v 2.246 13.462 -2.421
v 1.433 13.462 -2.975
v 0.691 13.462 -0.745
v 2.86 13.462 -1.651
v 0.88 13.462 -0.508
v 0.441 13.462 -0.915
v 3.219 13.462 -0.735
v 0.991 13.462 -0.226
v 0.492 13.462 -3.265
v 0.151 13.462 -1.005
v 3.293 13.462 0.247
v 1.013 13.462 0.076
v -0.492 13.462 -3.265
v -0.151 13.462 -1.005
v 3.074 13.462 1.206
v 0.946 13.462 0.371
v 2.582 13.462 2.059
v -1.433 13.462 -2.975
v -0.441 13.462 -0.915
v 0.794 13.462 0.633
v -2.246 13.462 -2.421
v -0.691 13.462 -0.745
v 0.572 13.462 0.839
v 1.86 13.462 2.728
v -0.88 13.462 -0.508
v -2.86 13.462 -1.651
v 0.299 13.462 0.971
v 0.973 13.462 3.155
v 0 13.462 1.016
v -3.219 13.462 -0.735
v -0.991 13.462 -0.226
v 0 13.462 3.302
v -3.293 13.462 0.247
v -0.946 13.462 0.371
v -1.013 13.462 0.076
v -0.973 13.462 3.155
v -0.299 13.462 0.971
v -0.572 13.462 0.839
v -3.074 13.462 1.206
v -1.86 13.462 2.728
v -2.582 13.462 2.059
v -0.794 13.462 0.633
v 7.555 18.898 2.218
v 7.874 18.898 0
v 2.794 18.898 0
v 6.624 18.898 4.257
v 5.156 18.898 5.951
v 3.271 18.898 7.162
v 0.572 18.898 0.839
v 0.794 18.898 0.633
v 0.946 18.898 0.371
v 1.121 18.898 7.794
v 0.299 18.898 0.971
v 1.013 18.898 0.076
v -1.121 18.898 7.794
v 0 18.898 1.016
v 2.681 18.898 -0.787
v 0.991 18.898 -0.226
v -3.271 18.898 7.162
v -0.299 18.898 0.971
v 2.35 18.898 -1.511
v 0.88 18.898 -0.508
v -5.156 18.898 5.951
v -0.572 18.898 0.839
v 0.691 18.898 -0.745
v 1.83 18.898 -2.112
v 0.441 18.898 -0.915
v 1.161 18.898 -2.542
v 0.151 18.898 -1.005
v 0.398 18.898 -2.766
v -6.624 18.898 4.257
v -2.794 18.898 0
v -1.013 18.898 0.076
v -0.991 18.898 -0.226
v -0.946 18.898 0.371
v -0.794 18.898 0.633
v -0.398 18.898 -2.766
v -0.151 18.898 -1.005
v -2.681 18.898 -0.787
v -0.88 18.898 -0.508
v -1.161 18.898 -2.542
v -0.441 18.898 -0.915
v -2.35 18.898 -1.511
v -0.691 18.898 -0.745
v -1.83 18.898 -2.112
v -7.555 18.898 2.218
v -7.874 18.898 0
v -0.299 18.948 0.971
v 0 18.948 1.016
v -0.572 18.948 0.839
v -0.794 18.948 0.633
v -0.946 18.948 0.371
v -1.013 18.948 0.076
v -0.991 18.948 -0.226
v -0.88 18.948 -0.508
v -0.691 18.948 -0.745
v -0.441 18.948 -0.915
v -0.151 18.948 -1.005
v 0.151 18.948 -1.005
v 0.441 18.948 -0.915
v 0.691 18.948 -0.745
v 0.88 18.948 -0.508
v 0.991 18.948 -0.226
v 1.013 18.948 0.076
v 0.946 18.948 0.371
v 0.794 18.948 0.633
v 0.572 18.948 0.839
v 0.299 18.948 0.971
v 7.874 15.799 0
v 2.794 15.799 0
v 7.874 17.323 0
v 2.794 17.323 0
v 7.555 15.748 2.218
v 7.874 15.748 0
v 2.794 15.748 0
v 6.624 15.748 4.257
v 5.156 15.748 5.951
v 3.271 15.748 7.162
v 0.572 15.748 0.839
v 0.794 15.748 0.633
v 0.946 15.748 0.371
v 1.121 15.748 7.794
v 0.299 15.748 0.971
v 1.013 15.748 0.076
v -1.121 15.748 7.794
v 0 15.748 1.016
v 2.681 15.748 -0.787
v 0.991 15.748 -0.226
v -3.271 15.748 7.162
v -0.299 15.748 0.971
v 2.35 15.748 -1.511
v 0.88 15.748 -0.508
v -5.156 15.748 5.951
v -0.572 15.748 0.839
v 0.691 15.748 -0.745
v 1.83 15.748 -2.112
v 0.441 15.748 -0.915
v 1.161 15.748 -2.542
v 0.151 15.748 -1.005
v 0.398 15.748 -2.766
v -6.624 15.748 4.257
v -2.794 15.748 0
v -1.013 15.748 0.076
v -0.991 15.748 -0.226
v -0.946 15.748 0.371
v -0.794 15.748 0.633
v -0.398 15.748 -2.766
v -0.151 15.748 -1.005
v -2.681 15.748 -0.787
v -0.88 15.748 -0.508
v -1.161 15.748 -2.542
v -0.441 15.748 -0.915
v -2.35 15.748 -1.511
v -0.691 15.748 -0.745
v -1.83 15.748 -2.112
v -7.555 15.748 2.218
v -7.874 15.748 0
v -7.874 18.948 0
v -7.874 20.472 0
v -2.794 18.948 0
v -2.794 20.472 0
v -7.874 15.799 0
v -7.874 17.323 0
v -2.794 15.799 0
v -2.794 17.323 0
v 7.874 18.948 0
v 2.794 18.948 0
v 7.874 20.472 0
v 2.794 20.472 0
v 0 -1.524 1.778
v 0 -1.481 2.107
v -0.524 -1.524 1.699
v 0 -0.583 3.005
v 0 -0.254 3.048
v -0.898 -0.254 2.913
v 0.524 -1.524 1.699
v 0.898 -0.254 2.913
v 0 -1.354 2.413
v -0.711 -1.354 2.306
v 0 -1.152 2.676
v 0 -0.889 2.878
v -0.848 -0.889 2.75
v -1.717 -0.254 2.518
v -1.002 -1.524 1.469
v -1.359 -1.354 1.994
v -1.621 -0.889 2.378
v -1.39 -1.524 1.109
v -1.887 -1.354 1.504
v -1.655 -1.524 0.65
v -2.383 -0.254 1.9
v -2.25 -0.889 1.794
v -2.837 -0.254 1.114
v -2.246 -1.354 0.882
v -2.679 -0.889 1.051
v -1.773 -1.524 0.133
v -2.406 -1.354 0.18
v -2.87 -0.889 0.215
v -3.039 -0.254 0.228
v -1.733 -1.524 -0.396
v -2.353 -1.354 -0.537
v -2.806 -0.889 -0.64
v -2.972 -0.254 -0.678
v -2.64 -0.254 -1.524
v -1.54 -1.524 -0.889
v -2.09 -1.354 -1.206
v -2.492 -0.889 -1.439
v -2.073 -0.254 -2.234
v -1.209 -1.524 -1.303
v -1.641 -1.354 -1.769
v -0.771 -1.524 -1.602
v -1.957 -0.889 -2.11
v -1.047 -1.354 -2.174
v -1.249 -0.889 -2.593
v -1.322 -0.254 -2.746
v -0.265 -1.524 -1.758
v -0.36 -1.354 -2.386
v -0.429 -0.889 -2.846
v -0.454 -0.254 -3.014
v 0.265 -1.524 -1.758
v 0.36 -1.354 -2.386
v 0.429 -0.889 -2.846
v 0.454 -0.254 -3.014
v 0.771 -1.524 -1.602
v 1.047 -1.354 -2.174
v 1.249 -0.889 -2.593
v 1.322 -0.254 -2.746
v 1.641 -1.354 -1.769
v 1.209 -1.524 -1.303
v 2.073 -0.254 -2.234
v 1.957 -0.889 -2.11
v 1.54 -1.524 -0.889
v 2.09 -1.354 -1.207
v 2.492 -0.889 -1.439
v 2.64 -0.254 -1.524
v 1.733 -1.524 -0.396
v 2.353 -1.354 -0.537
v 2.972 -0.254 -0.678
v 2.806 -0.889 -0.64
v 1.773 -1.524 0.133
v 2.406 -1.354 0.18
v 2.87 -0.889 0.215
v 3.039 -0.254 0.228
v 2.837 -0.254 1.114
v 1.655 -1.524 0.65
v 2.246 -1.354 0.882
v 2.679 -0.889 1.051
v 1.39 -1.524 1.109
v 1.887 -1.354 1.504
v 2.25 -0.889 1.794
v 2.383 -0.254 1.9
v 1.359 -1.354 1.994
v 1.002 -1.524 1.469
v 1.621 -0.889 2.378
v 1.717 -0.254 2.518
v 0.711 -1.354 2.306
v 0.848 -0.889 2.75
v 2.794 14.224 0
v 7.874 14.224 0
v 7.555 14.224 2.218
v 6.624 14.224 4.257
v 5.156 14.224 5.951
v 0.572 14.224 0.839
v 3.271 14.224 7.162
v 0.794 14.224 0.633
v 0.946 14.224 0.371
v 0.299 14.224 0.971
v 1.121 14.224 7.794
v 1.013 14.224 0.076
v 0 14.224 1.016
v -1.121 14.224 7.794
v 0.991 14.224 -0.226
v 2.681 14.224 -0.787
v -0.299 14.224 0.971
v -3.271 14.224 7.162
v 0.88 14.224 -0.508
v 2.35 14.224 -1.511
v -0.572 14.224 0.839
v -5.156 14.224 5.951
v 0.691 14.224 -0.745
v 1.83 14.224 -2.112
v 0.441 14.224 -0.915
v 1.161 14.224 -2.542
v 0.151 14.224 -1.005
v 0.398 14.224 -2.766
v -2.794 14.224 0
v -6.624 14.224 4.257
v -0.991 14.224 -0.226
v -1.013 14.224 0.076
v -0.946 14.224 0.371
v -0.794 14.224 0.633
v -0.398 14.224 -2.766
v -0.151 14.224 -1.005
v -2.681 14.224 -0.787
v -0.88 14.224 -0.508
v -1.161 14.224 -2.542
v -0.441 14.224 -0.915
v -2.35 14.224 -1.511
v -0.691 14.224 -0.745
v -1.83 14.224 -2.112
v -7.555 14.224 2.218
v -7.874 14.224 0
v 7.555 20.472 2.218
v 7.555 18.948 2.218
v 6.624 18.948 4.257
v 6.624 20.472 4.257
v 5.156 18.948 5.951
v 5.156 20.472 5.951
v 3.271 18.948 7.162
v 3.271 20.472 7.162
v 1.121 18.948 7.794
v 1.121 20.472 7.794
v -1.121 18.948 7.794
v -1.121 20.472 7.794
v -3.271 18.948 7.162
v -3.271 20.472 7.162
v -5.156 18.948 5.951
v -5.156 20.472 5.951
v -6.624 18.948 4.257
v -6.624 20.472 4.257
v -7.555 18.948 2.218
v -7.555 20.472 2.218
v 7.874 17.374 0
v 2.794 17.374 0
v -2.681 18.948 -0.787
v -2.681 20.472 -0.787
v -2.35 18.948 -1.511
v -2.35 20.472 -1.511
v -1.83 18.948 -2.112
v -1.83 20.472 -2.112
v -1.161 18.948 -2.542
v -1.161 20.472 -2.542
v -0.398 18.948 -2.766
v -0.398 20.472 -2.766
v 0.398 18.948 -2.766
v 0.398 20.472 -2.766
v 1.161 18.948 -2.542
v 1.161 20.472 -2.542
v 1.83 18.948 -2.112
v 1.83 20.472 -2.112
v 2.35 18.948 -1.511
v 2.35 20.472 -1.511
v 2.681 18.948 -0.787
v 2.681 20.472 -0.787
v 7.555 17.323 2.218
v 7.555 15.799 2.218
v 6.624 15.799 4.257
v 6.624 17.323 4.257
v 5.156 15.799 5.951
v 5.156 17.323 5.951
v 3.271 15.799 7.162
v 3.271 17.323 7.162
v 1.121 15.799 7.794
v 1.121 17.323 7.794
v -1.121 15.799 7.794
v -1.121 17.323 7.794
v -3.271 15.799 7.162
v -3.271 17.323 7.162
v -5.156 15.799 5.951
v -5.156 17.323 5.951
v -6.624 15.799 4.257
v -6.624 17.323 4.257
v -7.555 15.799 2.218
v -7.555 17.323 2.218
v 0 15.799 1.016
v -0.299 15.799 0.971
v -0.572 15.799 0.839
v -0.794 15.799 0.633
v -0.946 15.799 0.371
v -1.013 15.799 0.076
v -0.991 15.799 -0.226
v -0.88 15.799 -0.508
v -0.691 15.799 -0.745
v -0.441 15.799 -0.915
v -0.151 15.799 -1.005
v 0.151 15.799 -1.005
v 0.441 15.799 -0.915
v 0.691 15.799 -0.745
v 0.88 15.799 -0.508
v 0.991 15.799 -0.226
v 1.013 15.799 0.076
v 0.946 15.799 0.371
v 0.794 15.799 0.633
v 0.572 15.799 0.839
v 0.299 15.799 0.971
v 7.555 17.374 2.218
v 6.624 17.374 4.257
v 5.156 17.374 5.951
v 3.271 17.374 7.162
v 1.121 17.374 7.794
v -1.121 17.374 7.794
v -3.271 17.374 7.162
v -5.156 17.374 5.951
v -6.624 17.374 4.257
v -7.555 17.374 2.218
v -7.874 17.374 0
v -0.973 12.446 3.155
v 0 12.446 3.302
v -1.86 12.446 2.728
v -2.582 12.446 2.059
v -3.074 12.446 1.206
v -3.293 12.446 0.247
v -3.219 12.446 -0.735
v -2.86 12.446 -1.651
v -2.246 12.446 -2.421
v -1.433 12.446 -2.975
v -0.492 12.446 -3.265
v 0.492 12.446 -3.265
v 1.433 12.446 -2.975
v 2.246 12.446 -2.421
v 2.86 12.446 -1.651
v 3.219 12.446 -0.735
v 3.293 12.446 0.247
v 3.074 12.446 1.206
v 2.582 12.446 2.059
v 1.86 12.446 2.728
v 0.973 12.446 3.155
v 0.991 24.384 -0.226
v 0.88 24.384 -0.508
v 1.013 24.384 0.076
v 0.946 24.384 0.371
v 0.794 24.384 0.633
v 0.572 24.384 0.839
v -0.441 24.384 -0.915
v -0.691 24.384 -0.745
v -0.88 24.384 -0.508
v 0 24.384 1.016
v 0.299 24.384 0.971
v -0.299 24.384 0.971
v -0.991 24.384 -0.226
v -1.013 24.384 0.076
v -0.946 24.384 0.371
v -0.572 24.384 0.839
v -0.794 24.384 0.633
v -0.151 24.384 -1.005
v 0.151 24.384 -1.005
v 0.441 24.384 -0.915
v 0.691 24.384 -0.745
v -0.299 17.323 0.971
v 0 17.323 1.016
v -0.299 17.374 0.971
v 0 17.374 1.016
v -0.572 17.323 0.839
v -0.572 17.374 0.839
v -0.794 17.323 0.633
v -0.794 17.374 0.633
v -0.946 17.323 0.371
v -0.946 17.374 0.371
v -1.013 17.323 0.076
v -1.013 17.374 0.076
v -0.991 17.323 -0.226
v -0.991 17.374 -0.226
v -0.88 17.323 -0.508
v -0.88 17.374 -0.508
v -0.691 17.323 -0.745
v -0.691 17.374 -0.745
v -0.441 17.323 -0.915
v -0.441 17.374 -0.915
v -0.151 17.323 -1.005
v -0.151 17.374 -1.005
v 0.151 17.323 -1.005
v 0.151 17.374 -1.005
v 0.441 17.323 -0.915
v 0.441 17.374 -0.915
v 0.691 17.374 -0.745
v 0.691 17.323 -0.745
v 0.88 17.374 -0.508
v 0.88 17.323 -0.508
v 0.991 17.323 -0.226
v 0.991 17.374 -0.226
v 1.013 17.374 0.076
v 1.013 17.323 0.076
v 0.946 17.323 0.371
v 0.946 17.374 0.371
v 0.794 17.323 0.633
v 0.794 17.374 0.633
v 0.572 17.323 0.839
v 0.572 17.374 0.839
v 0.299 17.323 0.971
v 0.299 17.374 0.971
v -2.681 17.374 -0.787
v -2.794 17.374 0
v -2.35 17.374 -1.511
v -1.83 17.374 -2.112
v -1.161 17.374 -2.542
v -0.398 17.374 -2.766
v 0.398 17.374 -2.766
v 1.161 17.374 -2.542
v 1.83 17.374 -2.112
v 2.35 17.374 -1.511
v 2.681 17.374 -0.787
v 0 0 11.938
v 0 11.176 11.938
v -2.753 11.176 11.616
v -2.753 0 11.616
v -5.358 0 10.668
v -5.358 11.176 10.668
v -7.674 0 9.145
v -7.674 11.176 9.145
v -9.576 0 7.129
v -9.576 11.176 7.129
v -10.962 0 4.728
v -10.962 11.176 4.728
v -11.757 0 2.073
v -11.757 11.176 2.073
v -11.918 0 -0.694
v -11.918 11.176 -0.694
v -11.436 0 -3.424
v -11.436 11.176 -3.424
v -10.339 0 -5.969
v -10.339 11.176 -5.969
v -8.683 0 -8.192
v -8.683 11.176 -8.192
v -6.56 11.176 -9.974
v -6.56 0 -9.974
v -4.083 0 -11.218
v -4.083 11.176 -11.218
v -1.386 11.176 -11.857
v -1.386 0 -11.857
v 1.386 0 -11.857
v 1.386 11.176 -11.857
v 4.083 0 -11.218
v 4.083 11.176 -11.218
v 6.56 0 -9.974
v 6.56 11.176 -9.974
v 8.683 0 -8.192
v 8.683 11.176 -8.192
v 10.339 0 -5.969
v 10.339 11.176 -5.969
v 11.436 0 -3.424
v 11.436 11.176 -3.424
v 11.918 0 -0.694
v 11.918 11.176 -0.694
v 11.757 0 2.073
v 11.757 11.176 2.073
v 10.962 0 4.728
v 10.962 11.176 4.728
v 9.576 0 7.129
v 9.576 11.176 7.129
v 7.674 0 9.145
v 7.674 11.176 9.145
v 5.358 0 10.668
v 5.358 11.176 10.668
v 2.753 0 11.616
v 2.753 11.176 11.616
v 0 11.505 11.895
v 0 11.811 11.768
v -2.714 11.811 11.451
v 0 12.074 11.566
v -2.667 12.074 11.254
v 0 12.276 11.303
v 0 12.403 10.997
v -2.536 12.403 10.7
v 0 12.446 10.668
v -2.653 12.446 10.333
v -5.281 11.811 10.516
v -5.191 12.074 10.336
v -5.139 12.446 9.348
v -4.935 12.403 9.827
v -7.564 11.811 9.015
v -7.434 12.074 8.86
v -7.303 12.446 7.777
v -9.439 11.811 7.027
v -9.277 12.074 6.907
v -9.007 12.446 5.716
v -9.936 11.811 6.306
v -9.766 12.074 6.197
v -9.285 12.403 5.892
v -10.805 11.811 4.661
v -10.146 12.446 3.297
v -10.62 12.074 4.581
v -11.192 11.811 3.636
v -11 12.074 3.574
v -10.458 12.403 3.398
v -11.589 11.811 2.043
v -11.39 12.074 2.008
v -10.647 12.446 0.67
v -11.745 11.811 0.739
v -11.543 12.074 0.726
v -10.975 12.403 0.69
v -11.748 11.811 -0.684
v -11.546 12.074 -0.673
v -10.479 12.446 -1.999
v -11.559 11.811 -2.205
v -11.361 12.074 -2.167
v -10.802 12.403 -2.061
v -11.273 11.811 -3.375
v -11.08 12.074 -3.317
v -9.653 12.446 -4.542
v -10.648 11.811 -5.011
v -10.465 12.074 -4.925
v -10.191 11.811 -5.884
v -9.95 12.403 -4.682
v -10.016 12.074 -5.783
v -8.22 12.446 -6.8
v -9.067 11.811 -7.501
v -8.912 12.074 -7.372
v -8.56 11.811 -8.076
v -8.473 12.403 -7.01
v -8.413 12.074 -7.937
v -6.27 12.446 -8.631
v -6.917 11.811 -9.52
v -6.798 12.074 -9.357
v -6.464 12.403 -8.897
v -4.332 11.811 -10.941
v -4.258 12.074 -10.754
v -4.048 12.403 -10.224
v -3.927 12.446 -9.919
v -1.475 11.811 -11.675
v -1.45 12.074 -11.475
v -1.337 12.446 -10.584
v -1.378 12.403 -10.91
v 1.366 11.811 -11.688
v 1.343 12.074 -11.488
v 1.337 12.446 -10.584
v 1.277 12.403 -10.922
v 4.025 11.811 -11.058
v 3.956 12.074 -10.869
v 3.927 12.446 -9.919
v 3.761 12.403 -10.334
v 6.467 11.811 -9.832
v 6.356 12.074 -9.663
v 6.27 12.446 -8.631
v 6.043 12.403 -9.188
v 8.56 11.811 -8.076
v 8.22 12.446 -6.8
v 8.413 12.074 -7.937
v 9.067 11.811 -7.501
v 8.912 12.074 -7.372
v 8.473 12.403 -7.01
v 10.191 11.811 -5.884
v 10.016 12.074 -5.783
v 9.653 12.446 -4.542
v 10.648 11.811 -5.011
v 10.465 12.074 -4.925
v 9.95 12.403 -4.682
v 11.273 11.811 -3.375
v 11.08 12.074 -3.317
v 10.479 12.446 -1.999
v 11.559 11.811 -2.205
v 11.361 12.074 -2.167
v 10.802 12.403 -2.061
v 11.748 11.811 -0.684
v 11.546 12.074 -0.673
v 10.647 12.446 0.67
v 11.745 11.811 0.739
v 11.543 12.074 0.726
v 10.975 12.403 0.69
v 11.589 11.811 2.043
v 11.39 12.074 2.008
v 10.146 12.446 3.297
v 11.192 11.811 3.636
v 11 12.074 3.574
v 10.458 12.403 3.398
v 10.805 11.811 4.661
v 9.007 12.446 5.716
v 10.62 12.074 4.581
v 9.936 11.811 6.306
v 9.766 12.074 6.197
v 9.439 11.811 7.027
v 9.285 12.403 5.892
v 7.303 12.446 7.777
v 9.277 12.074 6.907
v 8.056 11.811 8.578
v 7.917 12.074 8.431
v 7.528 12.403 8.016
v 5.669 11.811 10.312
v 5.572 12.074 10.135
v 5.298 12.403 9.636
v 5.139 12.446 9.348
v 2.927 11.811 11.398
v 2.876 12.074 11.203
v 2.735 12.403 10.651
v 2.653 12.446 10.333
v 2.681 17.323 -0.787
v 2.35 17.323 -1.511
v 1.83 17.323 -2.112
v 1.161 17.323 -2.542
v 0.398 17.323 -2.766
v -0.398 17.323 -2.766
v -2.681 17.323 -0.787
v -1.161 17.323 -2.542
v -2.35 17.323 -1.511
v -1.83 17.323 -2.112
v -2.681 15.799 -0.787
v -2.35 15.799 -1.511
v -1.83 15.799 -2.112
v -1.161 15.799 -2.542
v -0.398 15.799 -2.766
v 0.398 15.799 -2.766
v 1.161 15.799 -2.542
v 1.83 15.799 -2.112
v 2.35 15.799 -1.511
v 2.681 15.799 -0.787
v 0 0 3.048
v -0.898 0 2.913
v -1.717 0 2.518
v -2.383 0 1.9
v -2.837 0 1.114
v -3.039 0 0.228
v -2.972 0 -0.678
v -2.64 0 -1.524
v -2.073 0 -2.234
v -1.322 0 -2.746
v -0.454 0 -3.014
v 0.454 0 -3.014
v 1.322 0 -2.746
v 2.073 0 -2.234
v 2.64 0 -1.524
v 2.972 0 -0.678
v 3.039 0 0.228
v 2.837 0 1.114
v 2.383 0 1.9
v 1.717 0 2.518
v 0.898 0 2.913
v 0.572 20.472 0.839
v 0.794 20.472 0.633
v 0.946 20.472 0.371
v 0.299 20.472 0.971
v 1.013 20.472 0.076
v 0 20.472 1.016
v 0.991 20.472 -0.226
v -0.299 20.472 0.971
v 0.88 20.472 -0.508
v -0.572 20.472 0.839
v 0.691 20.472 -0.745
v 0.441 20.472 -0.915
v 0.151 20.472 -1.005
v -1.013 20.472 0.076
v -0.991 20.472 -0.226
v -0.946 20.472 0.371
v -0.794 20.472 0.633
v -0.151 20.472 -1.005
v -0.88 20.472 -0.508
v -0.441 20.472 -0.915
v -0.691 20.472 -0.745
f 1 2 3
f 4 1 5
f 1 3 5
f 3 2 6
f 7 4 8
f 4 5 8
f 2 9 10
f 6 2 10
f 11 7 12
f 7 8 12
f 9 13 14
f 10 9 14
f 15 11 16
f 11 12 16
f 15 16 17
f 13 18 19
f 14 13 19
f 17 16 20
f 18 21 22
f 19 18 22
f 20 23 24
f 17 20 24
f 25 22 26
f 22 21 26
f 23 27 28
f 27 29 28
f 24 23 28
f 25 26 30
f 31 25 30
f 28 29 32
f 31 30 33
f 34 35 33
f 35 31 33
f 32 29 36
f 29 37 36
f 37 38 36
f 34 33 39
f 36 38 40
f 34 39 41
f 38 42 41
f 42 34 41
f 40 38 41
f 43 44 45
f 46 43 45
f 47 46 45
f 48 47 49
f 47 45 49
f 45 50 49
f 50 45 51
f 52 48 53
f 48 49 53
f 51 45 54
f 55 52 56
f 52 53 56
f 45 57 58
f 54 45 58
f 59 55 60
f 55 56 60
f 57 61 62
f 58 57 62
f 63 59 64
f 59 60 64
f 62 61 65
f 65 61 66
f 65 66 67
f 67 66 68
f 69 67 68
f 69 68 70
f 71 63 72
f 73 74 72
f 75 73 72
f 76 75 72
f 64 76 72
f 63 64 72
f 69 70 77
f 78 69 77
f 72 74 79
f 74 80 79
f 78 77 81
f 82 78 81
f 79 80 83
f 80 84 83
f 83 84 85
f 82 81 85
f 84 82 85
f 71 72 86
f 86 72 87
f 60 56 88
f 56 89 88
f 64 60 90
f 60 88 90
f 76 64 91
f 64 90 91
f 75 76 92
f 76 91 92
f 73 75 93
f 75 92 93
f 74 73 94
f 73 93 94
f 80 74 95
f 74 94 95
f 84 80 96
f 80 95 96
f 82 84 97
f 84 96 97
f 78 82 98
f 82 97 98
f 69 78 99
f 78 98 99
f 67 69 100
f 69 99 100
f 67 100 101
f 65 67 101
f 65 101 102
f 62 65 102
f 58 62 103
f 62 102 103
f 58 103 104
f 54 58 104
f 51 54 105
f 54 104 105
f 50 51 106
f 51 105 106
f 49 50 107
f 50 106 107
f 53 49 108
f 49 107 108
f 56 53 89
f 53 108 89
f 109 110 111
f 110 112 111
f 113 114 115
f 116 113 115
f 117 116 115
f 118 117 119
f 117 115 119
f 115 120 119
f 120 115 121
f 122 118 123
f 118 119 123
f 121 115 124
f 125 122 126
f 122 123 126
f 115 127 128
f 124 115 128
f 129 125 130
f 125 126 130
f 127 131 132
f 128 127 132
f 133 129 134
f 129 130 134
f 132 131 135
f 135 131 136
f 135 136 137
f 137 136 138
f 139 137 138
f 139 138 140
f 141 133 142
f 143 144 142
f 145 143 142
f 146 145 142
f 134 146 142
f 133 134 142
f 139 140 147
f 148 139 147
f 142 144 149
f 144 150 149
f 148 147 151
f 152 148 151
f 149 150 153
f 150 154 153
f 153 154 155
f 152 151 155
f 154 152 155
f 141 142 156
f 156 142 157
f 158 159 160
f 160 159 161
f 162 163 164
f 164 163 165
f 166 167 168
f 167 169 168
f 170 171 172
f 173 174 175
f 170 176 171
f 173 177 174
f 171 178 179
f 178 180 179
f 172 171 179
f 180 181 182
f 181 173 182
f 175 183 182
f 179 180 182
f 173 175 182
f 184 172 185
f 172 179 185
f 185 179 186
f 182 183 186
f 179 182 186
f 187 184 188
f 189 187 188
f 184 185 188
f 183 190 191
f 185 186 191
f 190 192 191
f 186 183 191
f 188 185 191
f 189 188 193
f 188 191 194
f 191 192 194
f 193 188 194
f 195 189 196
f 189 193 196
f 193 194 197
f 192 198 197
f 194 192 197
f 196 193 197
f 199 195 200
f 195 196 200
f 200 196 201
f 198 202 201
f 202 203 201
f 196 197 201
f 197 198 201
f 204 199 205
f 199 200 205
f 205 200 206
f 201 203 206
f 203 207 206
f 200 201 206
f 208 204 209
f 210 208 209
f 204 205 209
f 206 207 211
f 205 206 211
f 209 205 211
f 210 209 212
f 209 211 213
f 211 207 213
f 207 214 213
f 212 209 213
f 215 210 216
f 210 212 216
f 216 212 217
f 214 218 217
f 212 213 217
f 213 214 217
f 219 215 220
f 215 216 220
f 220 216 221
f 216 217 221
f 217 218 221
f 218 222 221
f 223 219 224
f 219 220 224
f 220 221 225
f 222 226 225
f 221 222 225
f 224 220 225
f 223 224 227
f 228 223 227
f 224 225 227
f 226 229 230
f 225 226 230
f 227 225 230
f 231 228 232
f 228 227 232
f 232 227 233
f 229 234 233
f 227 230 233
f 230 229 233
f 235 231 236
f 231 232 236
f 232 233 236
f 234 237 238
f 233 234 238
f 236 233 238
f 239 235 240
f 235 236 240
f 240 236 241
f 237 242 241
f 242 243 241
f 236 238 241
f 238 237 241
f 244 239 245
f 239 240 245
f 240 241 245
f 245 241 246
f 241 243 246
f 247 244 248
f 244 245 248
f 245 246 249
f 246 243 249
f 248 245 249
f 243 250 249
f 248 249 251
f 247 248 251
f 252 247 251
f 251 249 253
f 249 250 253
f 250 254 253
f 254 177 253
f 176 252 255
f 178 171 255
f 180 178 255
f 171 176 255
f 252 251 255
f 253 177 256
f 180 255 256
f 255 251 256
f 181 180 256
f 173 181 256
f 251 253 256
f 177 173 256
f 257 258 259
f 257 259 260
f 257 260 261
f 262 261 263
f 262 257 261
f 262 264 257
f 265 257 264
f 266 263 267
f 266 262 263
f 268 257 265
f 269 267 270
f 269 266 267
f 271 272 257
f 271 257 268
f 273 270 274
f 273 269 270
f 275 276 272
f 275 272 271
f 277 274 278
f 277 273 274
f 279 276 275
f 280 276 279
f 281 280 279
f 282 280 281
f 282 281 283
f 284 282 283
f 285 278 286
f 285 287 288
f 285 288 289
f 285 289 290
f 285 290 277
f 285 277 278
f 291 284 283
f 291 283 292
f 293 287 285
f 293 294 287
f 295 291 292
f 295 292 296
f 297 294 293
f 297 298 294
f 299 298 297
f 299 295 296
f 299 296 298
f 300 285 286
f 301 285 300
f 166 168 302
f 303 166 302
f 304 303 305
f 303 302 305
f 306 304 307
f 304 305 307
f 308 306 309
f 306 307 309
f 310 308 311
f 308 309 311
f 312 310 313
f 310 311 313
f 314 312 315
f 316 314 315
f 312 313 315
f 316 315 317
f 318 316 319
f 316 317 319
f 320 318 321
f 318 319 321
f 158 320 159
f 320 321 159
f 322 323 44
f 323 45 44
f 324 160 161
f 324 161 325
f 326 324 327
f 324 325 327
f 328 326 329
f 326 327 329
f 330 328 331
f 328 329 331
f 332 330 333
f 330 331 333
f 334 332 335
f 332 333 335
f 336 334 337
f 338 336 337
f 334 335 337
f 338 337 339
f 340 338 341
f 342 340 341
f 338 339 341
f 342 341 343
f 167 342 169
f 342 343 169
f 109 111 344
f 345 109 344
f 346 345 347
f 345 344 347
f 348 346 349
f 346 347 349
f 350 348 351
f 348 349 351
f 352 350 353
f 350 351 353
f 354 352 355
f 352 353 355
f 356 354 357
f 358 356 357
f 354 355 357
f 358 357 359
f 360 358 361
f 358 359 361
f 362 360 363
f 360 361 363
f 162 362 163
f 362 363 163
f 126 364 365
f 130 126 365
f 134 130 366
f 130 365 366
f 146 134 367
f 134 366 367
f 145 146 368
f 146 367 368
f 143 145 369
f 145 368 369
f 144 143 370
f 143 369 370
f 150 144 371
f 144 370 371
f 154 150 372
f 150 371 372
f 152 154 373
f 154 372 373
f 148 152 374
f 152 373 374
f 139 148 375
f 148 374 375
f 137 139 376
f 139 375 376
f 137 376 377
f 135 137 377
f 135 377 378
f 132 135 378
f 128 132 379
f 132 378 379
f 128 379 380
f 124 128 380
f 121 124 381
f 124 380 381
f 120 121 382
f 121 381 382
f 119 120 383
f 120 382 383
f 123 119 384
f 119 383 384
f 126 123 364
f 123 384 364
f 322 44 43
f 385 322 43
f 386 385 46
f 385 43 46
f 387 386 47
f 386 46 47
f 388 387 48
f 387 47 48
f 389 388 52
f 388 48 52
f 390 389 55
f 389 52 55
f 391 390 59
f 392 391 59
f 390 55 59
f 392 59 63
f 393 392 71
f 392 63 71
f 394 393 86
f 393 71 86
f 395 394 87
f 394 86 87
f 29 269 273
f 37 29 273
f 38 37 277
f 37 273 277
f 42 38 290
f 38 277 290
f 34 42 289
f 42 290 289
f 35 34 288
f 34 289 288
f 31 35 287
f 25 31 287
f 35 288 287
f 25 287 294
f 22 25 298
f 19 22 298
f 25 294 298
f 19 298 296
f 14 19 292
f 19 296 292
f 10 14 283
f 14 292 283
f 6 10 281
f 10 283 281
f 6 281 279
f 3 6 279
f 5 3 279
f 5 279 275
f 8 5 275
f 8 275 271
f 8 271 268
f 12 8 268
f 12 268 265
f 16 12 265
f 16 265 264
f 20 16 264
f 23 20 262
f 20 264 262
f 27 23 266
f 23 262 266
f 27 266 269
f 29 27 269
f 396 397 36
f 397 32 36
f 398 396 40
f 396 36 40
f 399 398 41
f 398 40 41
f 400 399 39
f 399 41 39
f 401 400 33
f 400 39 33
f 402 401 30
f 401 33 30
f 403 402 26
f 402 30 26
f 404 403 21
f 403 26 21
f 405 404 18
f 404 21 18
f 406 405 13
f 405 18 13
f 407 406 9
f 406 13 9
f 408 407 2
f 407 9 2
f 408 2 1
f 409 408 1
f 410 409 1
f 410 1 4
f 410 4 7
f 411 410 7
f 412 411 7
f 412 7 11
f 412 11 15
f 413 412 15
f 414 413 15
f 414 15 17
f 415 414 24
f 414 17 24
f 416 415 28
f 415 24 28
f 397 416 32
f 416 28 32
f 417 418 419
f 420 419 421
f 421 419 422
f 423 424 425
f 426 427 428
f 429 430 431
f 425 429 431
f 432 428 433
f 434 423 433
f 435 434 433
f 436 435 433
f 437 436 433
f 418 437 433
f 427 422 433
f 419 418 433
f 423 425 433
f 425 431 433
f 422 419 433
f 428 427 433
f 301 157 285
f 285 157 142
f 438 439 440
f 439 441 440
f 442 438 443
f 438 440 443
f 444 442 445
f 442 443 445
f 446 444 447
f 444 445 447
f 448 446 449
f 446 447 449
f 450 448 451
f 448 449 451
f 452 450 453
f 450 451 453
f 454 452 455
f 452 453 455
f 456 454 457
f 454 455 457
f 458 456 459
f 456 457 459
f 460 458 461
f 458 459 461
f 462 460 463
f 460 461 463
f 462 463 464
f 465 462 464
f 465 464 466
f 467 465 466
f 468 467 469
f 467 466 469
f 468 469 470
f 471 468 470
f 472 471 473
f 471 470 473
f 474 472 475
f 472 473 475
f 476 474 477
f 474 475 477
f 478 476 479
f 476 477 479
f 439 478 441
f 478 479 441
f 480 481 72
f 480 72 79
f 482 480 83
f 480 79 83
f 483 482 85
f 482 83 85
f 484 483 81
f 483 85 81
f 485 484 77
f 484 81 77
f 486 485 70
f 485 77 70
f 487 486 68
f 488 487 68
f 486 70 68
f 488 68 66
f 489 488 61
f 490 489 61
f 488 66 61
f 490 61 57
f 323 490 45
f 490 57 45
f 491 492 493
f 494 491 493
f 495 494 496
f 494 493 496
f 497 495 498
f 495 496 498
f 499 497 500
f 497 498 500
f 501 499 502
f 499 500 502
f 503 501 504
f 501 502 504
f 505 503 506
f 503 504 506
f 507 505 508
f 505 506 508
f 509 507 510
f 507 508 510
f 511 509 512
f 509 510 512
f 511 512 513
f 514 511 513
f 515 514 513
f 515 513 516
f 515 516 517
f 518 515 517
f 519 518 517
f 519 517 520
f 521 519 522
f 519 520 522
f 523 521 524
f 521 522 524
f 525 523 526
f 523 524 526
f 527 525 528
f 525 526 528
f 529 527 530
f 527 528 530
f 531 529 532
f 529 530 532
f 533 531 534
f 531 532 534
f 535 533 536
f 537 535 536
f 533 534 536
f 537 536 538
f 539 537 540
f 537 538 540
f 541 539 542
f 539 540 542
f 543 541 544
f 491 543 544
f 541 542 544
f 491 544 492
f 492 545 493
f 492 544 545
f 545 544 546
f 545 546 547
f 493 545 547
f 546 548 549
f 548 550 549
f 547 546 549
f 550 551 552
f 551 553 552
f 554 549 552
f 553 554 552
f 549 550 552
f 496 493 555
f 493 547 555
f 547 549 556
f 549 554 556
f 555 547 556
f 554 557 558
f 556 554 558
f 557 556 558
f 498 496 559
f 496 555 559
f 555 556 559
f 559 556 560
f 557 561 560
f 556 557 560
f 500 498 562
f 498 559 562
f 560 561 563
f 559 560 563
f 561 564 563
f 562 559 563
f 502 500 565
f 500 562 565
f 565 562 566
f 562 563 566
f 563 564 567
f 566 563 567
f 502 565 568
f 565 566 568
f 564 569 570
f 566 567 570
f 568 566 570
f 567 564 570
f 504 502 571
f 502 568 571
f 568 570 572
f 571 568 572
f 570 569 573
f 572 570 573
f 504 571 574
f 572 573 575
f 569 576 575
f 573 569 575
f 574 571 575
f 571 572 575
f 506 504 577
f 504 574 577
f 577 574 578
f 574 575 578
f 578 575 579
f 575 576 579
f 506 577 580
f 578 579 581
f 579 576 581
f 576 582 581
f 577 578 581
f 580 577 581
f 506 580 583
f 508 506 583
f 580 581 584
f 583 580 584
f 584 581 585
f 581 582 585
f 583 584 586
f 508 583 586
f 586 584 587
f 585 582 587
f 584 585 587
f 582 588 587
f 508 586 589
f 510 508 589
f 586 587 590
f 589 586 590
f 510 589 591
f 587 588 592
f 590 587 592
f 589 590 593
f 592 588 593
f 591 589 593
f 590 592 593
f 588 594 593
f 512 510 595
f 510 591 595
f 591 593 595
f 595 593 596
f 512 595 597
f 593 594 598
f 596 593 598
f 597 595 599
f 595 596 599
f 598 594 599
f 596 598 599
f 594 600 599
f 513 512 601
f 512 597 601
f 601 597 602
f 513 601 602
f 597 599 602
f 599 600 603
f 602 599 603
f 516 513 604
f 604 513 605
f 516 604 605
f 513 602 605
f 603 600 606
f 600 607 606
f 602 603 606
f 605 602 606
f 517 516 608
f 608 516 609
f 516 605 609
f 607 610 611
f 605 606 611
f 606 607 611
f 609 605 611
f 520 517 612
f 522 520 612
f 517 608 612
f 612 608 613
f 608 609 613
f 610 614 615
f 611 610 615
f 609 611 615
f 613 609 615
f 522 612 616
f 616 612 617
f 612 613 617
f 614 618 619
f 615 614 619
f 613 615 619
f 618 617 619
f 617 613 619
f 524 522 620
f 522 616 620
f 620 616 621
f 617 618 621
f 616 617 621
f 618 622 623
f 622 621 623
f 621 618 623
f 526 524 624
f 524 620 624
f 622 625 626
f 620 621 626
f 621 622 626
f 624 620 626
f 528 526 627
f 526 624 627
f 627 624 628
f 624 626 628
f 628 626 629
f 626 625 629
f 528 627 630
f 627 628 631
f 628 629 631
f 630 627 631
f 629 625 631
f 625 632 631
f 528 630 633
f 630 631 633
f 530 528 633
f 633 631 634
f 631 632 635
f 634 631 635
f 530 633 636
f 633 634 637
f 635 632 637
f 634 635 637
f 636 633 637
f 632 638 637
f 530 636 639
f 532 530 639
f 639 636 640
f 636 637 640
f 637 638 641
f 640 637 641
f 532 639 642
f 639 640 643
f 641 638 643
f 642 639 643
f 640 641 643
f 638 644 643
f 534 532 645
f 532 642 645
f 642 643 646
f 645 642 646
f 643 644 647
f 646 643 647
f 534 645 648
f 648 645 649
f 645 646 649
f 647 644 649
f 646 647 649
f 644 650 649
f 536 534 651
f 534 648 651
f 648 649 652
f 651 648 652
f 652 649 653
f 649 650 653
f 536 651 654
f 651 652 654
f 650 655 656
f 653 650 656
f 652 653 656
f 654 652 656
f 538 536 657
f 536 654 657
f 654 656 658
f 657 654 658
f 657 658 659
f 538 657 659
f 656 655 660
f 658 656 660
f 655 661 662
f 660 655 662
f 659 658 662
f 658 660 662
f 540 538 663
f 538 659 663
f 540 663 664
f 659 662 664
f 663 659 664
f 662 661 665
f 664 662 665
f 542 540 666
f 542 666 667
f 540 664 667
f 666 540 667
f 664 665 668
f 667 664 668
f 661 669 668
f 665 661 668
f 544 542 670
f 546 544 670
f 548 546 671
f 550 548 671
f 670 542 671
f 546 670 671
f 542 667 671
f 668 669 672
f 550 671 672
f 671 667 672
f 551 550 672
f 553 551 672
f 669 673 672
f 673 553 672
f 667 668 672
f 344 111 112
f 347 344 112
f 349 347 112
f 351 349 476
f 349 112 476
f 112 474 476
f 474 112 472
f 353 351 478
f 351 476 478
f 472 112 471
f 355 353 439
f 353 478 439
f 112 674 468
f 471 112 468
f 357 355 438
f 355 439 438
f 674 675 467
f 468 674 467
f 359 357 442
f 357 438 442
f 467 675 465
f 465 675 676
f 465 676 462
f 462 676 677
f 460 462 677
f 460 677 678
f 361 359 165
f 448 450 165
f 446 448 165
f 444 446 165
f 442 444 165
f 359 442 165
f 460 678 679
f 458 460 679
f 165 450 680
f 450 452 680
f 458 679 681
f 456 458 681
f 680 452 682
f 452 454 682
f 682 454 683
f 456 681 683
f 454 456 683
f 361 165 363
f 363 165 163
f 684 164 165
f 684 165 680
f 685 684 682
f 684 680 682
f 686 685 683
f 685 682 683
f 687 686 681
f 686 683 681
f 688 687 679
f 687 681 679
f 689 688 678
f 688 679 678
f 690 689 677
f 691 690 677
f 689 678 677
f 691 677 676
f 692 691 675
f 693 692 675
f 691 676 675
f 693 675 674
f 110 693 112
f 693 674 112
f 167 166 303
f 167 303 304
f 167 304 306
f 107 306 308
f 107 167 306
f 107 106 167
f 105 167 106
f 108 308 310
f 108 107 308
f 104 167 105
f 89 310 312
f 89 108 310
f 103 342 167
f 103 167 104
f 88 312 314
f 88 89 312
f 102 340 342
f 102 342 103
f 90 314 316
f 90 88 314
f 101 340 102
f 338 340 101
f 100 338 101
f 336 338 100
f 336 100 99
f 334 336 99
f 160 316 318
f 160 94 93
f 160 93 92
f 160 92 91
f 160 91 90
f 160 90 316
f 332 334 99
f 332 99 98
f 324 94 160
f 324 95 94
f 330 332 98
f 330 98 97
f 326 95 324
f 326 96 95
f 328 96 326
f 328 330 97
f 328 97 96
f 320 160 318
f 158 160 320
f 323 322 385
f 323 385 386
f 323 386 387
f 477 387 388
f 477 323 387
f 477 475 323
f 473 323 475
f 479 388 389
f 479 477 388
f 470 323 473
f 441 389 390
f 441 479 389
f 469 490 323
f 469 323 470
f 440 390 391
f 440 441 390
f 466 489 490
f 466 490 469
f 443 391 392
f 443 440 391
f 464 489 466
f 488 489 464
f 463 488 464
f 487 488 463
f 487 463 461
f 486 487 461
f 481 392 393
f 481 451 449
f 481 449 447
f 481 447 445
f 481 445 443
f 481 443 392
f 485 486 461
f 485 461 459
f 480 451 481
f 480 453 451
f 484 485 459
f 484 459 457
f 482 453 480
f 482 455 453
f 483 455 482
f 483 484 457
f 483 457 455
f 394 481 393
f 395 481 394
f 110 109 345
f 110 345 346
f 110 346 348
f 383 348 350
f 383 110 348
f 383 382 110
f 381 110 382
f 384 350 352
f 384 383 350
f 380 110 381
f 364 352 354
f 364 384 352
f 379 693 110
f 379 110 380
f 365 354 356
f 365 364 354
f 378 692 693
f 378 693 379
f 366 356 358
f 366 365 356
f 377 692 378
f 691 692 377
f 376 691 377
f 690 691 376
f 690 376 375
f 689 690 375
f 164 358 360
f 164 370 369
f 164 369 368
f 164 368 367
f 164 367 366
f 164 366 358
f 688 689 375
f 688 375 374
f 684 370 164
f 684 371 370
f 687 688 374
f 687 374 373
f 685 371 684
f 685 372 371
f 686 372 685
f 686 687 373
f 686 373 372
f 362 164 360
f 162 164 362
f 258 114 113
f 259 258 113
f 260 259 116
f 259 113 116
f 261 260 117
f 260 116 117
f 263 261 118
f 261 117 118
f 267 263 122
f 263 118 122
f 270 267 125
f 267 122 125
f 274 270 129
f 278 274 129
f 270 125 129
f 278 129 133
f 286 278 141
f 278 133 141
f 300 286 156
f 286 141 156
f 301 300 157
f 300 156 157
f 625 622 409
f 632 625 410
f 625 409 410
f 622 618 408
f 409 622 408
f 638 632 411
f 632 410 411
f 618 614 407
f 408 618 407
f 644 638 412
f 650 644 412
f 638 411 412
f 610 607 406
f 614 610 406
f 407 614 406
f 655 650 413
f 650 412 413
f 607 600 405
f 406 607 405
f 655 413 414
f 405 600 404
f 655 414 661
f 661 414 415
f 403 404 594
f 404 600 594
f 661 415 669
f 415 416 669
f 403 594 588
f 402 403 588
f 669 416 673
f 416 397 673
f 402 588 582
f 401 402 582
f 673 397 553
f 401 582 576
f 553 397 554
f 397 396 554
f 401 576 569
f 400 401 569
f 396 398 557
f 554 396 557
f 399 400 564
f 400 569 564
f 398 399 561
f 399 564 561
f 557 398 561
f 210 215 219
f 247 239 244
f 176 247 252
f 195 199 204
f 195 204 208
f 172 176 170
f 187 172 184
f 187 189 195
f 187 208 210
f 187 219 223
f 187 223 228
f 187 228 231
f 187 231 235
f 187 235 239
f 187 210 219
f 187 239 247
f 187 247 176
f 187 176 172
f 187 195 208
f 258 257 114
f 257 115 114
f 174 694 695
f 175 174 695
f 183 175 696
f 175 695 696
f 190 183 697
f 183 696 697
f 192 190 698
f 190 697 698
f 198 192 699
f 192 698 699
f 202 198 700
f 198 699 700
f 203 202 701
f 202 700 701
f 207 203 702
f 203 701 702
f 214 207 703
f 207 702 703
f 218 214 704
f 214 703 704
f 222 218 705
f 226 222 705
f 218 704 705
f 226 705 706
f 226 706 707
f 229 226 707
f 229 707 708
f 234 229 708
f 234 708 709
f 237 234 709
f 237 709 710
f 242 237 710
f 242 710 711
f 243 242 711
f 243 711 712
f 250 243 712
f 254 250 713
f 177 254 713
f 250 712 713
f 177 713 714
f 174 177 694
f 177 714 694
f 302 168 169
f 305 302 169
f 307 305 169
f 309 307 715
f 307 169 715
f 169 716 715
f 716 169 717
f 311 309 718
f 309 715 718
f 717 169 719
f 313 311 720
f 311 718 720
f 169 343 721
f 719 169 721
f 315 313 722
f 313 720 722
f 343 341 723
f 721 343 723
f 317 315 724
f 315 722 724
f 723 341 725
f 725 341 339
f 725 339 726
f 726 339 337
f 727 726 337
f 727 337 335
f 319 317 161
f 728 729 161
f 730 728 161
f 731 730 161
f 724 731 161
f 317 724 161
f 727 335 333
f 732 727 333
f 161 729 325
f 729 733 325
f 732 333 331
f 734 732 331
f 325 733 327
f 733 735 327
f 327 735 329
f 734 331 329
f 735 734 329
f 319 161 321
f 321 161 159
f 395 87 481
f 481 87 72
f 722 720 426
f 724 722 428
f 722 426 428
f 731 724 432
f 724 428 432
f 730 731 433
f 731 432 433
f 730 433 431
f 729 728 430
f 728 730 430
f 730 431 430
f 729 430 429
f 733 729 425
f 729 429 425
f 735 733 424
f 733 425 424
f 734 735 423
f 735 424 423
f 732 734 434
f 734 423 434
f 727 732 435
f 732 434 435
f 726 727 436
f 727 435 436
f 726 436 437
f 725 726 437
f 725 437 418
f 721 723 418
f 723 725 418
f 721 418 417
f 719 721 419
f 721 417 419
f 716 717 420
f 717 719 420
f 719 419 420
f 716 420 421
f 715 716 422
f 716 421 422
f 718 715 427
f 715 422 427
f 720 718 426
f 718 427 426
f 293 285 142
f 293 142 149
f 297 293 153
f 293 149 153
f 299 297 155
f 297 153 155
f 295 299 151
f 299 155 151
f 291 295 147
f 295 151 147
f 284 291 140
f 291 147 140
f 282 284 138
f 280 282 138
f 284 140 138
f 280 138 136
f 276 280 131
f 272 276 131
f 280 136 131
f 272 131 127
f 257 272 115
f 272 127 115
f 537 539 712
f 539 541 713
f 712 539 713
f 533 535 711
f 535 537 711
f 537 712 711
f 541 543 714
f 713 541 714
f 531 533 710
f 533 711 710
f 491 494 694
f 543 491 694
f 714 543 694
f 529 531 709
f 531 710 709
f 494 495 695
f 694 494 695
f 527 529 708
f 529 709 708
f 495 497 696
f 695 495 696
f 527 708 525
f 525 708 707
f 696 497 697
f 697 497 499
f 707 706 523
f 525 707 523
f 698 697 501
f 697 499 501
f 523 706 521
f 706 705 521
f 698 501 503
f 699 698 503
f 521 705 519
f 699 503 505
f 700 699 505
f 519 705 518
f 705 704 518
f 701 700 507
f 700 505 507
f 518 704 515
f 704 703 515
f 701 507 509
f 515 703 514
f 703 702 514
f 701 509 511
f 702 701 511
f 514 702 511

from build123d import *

# Parameters (mm, degrees)
SKETCH1_W           = 1.016
SKETCH1_H           = 10.922
SKETCH1_W_2         = 3.048
SKETCH1_H_2         = 1.524
FILLET1_R           = 1.27
BOSS_EXTRUDE1_DEPTH = 0.762
LPATTERN1_COUNT     = 4
LPATTERN1_PITCH     = 1.5748


with BuildPart() as part:
    # Sketch1 → Revolve1 (revolve)
    with BuildSketch(Plane.XY, mode=Mode.PRIVATE) as revolve1_sk:
        Polygon((-3.302, 13.462), (0, 13.462), (0, 0), (-11.938, 0), (-11.938, 12.446), (-3.302, 12.446), align=None)
        with Locations((-0.508, 18.923)):
            Rectangle(SKETCH1_W, SKETCH1_H)
        with Locations((-1.524, -0.762)):
            Rectangle(SKETCH1_W_2, SKETCH1_H_2)
    revolve(revolve1_sk.sketch.rotate(Axis((0, 0, 0), (0, -1, 0)), 270), axis=Axis((0, 0, 0), (0, -1, 0)))

    # Fillet1
    fillet1_edges = [part.edges().sort_by_distance(p)[0] for p in [
        (0, -1.524, -3.048),
        (0, 12.446, -11.938),
    ]]
    fillet(fillet1_edges, radius=FILLET1_R)

    # Sketch2 → Boss-Extrude1 (add, symmetric)
    with BuildSketch(Plane(origin=(0, 14.986, 0), x_dir=(1, 0, 0), z_dir=(0, 1, 0))):
        with BuildLine():
            Line((-7.874, 0), (-2.794, 0))
            ThreePointArc((-2.794, 0), (0, 2.794), (2.794, 0))
            Line((2.794, 0), (7.874, 0))
            ThreePointArc((7.874, 0), (0, -7.874), (-7.874, 0))
        make_face()
    boss_extrude1 = extrude(amount=BOSS_EXTRUDE1_DEPTH, both=True)

    # LPattern1: Boss-Extrude1 ×4
    with Locations(*[(0, i * LPATTERN1_PITCH, 0) for i in range(1, LPATTERN1_COUNT)]):
        add(boss_extrude1)


solid = part.part
